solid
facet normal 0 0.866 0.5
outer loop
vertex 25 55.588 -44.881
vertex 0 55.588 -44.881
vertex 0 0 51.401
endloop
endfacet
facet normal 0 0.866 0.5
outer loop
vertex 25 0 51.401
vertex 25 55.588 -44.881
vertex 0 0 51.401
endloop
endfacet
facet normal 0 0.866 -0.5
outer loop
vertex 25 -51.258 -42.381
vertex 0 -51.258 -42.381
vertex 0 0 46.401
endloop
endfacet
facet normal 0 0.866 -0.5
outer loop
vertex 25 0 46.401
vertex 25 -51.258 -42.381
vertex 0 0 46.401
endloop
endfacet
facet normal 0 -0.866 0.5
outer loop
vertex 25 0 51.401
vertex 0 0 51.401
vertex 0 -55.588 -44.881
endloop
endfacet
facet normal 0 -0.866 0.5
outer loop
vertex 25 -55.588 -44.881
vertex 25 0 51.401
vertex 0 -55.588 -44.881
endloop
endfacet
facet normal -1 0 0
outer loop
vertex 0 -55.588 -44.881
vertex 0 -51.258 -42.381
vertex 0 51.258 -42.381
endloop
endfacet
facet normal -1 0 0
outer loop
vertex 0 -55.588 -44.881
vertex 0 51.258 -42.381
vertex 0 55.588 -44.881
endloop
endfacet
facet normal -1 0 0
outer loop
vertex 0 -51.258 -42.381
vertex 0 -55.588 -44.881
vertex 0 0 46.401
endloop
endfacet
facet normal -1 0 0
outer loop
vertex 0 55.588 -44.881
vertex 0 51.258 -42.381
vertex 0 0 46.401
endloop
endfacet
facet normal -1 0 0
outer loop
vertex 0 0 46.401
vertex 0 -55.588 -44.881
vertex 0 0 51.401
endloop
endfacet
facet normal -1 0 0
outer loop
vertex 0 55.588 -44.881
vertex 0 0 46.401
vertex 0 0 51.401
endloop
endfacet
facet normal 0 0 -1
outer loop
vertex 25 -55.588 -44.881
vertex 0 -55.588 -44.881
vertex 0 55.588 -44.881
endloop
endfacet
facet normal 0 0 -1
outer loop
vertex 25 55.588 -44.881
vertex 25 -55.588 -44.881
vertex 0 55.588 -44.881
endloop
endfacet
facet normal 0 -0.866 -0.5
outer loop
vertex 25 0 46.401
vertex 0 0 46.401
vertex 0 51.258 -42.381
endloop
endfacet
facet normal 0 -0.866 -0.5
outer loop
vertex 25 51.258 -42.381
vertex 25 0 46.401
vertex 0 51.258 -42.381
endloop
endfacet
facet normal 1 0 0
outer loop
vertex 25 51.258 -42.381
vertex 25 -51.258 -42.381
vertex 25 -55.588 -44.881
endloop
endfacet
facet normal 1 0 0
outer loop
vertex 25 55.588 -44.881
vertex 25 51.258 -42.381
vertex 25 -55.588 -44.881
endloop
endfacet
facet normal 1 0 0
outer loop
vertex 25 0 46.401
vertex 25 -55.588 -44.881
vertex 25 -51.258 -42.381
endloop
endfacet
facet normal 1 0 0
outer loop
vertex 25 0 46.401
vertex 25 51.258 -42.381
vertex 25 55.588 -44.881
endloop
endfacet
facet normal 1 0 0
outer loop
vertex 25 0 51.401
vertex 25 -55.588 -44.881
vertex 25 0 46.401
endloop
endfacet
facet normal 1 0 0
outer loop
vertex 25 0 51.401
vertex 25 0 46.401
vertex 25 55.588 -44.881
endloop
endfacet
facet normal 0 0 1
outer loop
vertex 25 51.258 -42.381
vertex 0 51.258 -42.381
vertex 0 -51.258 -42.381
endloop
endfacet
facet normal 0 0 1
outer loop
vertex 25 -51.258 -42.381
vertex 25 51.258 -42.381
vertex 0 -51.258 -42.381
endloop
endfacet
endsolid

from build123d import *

# Parameters (mm, degrees)
F2_DEPTH = 25


with BuildPart() as f2:
    # F1 (on face) → F2 (new body)
    with BuildSketch(Plane.YZ):
        Polygon((-55.588484, -44.88135), (55.588484, -44.88135), (0, 51.400729), align=None)
        Polygon((51.258357, -42.38135), (-51.258357, -42.38135), (0, 46.400729), align=None, mode=Mode.SUBTRACT)
    extrude(amount=F2_DEPTH)


solid = f2.part
